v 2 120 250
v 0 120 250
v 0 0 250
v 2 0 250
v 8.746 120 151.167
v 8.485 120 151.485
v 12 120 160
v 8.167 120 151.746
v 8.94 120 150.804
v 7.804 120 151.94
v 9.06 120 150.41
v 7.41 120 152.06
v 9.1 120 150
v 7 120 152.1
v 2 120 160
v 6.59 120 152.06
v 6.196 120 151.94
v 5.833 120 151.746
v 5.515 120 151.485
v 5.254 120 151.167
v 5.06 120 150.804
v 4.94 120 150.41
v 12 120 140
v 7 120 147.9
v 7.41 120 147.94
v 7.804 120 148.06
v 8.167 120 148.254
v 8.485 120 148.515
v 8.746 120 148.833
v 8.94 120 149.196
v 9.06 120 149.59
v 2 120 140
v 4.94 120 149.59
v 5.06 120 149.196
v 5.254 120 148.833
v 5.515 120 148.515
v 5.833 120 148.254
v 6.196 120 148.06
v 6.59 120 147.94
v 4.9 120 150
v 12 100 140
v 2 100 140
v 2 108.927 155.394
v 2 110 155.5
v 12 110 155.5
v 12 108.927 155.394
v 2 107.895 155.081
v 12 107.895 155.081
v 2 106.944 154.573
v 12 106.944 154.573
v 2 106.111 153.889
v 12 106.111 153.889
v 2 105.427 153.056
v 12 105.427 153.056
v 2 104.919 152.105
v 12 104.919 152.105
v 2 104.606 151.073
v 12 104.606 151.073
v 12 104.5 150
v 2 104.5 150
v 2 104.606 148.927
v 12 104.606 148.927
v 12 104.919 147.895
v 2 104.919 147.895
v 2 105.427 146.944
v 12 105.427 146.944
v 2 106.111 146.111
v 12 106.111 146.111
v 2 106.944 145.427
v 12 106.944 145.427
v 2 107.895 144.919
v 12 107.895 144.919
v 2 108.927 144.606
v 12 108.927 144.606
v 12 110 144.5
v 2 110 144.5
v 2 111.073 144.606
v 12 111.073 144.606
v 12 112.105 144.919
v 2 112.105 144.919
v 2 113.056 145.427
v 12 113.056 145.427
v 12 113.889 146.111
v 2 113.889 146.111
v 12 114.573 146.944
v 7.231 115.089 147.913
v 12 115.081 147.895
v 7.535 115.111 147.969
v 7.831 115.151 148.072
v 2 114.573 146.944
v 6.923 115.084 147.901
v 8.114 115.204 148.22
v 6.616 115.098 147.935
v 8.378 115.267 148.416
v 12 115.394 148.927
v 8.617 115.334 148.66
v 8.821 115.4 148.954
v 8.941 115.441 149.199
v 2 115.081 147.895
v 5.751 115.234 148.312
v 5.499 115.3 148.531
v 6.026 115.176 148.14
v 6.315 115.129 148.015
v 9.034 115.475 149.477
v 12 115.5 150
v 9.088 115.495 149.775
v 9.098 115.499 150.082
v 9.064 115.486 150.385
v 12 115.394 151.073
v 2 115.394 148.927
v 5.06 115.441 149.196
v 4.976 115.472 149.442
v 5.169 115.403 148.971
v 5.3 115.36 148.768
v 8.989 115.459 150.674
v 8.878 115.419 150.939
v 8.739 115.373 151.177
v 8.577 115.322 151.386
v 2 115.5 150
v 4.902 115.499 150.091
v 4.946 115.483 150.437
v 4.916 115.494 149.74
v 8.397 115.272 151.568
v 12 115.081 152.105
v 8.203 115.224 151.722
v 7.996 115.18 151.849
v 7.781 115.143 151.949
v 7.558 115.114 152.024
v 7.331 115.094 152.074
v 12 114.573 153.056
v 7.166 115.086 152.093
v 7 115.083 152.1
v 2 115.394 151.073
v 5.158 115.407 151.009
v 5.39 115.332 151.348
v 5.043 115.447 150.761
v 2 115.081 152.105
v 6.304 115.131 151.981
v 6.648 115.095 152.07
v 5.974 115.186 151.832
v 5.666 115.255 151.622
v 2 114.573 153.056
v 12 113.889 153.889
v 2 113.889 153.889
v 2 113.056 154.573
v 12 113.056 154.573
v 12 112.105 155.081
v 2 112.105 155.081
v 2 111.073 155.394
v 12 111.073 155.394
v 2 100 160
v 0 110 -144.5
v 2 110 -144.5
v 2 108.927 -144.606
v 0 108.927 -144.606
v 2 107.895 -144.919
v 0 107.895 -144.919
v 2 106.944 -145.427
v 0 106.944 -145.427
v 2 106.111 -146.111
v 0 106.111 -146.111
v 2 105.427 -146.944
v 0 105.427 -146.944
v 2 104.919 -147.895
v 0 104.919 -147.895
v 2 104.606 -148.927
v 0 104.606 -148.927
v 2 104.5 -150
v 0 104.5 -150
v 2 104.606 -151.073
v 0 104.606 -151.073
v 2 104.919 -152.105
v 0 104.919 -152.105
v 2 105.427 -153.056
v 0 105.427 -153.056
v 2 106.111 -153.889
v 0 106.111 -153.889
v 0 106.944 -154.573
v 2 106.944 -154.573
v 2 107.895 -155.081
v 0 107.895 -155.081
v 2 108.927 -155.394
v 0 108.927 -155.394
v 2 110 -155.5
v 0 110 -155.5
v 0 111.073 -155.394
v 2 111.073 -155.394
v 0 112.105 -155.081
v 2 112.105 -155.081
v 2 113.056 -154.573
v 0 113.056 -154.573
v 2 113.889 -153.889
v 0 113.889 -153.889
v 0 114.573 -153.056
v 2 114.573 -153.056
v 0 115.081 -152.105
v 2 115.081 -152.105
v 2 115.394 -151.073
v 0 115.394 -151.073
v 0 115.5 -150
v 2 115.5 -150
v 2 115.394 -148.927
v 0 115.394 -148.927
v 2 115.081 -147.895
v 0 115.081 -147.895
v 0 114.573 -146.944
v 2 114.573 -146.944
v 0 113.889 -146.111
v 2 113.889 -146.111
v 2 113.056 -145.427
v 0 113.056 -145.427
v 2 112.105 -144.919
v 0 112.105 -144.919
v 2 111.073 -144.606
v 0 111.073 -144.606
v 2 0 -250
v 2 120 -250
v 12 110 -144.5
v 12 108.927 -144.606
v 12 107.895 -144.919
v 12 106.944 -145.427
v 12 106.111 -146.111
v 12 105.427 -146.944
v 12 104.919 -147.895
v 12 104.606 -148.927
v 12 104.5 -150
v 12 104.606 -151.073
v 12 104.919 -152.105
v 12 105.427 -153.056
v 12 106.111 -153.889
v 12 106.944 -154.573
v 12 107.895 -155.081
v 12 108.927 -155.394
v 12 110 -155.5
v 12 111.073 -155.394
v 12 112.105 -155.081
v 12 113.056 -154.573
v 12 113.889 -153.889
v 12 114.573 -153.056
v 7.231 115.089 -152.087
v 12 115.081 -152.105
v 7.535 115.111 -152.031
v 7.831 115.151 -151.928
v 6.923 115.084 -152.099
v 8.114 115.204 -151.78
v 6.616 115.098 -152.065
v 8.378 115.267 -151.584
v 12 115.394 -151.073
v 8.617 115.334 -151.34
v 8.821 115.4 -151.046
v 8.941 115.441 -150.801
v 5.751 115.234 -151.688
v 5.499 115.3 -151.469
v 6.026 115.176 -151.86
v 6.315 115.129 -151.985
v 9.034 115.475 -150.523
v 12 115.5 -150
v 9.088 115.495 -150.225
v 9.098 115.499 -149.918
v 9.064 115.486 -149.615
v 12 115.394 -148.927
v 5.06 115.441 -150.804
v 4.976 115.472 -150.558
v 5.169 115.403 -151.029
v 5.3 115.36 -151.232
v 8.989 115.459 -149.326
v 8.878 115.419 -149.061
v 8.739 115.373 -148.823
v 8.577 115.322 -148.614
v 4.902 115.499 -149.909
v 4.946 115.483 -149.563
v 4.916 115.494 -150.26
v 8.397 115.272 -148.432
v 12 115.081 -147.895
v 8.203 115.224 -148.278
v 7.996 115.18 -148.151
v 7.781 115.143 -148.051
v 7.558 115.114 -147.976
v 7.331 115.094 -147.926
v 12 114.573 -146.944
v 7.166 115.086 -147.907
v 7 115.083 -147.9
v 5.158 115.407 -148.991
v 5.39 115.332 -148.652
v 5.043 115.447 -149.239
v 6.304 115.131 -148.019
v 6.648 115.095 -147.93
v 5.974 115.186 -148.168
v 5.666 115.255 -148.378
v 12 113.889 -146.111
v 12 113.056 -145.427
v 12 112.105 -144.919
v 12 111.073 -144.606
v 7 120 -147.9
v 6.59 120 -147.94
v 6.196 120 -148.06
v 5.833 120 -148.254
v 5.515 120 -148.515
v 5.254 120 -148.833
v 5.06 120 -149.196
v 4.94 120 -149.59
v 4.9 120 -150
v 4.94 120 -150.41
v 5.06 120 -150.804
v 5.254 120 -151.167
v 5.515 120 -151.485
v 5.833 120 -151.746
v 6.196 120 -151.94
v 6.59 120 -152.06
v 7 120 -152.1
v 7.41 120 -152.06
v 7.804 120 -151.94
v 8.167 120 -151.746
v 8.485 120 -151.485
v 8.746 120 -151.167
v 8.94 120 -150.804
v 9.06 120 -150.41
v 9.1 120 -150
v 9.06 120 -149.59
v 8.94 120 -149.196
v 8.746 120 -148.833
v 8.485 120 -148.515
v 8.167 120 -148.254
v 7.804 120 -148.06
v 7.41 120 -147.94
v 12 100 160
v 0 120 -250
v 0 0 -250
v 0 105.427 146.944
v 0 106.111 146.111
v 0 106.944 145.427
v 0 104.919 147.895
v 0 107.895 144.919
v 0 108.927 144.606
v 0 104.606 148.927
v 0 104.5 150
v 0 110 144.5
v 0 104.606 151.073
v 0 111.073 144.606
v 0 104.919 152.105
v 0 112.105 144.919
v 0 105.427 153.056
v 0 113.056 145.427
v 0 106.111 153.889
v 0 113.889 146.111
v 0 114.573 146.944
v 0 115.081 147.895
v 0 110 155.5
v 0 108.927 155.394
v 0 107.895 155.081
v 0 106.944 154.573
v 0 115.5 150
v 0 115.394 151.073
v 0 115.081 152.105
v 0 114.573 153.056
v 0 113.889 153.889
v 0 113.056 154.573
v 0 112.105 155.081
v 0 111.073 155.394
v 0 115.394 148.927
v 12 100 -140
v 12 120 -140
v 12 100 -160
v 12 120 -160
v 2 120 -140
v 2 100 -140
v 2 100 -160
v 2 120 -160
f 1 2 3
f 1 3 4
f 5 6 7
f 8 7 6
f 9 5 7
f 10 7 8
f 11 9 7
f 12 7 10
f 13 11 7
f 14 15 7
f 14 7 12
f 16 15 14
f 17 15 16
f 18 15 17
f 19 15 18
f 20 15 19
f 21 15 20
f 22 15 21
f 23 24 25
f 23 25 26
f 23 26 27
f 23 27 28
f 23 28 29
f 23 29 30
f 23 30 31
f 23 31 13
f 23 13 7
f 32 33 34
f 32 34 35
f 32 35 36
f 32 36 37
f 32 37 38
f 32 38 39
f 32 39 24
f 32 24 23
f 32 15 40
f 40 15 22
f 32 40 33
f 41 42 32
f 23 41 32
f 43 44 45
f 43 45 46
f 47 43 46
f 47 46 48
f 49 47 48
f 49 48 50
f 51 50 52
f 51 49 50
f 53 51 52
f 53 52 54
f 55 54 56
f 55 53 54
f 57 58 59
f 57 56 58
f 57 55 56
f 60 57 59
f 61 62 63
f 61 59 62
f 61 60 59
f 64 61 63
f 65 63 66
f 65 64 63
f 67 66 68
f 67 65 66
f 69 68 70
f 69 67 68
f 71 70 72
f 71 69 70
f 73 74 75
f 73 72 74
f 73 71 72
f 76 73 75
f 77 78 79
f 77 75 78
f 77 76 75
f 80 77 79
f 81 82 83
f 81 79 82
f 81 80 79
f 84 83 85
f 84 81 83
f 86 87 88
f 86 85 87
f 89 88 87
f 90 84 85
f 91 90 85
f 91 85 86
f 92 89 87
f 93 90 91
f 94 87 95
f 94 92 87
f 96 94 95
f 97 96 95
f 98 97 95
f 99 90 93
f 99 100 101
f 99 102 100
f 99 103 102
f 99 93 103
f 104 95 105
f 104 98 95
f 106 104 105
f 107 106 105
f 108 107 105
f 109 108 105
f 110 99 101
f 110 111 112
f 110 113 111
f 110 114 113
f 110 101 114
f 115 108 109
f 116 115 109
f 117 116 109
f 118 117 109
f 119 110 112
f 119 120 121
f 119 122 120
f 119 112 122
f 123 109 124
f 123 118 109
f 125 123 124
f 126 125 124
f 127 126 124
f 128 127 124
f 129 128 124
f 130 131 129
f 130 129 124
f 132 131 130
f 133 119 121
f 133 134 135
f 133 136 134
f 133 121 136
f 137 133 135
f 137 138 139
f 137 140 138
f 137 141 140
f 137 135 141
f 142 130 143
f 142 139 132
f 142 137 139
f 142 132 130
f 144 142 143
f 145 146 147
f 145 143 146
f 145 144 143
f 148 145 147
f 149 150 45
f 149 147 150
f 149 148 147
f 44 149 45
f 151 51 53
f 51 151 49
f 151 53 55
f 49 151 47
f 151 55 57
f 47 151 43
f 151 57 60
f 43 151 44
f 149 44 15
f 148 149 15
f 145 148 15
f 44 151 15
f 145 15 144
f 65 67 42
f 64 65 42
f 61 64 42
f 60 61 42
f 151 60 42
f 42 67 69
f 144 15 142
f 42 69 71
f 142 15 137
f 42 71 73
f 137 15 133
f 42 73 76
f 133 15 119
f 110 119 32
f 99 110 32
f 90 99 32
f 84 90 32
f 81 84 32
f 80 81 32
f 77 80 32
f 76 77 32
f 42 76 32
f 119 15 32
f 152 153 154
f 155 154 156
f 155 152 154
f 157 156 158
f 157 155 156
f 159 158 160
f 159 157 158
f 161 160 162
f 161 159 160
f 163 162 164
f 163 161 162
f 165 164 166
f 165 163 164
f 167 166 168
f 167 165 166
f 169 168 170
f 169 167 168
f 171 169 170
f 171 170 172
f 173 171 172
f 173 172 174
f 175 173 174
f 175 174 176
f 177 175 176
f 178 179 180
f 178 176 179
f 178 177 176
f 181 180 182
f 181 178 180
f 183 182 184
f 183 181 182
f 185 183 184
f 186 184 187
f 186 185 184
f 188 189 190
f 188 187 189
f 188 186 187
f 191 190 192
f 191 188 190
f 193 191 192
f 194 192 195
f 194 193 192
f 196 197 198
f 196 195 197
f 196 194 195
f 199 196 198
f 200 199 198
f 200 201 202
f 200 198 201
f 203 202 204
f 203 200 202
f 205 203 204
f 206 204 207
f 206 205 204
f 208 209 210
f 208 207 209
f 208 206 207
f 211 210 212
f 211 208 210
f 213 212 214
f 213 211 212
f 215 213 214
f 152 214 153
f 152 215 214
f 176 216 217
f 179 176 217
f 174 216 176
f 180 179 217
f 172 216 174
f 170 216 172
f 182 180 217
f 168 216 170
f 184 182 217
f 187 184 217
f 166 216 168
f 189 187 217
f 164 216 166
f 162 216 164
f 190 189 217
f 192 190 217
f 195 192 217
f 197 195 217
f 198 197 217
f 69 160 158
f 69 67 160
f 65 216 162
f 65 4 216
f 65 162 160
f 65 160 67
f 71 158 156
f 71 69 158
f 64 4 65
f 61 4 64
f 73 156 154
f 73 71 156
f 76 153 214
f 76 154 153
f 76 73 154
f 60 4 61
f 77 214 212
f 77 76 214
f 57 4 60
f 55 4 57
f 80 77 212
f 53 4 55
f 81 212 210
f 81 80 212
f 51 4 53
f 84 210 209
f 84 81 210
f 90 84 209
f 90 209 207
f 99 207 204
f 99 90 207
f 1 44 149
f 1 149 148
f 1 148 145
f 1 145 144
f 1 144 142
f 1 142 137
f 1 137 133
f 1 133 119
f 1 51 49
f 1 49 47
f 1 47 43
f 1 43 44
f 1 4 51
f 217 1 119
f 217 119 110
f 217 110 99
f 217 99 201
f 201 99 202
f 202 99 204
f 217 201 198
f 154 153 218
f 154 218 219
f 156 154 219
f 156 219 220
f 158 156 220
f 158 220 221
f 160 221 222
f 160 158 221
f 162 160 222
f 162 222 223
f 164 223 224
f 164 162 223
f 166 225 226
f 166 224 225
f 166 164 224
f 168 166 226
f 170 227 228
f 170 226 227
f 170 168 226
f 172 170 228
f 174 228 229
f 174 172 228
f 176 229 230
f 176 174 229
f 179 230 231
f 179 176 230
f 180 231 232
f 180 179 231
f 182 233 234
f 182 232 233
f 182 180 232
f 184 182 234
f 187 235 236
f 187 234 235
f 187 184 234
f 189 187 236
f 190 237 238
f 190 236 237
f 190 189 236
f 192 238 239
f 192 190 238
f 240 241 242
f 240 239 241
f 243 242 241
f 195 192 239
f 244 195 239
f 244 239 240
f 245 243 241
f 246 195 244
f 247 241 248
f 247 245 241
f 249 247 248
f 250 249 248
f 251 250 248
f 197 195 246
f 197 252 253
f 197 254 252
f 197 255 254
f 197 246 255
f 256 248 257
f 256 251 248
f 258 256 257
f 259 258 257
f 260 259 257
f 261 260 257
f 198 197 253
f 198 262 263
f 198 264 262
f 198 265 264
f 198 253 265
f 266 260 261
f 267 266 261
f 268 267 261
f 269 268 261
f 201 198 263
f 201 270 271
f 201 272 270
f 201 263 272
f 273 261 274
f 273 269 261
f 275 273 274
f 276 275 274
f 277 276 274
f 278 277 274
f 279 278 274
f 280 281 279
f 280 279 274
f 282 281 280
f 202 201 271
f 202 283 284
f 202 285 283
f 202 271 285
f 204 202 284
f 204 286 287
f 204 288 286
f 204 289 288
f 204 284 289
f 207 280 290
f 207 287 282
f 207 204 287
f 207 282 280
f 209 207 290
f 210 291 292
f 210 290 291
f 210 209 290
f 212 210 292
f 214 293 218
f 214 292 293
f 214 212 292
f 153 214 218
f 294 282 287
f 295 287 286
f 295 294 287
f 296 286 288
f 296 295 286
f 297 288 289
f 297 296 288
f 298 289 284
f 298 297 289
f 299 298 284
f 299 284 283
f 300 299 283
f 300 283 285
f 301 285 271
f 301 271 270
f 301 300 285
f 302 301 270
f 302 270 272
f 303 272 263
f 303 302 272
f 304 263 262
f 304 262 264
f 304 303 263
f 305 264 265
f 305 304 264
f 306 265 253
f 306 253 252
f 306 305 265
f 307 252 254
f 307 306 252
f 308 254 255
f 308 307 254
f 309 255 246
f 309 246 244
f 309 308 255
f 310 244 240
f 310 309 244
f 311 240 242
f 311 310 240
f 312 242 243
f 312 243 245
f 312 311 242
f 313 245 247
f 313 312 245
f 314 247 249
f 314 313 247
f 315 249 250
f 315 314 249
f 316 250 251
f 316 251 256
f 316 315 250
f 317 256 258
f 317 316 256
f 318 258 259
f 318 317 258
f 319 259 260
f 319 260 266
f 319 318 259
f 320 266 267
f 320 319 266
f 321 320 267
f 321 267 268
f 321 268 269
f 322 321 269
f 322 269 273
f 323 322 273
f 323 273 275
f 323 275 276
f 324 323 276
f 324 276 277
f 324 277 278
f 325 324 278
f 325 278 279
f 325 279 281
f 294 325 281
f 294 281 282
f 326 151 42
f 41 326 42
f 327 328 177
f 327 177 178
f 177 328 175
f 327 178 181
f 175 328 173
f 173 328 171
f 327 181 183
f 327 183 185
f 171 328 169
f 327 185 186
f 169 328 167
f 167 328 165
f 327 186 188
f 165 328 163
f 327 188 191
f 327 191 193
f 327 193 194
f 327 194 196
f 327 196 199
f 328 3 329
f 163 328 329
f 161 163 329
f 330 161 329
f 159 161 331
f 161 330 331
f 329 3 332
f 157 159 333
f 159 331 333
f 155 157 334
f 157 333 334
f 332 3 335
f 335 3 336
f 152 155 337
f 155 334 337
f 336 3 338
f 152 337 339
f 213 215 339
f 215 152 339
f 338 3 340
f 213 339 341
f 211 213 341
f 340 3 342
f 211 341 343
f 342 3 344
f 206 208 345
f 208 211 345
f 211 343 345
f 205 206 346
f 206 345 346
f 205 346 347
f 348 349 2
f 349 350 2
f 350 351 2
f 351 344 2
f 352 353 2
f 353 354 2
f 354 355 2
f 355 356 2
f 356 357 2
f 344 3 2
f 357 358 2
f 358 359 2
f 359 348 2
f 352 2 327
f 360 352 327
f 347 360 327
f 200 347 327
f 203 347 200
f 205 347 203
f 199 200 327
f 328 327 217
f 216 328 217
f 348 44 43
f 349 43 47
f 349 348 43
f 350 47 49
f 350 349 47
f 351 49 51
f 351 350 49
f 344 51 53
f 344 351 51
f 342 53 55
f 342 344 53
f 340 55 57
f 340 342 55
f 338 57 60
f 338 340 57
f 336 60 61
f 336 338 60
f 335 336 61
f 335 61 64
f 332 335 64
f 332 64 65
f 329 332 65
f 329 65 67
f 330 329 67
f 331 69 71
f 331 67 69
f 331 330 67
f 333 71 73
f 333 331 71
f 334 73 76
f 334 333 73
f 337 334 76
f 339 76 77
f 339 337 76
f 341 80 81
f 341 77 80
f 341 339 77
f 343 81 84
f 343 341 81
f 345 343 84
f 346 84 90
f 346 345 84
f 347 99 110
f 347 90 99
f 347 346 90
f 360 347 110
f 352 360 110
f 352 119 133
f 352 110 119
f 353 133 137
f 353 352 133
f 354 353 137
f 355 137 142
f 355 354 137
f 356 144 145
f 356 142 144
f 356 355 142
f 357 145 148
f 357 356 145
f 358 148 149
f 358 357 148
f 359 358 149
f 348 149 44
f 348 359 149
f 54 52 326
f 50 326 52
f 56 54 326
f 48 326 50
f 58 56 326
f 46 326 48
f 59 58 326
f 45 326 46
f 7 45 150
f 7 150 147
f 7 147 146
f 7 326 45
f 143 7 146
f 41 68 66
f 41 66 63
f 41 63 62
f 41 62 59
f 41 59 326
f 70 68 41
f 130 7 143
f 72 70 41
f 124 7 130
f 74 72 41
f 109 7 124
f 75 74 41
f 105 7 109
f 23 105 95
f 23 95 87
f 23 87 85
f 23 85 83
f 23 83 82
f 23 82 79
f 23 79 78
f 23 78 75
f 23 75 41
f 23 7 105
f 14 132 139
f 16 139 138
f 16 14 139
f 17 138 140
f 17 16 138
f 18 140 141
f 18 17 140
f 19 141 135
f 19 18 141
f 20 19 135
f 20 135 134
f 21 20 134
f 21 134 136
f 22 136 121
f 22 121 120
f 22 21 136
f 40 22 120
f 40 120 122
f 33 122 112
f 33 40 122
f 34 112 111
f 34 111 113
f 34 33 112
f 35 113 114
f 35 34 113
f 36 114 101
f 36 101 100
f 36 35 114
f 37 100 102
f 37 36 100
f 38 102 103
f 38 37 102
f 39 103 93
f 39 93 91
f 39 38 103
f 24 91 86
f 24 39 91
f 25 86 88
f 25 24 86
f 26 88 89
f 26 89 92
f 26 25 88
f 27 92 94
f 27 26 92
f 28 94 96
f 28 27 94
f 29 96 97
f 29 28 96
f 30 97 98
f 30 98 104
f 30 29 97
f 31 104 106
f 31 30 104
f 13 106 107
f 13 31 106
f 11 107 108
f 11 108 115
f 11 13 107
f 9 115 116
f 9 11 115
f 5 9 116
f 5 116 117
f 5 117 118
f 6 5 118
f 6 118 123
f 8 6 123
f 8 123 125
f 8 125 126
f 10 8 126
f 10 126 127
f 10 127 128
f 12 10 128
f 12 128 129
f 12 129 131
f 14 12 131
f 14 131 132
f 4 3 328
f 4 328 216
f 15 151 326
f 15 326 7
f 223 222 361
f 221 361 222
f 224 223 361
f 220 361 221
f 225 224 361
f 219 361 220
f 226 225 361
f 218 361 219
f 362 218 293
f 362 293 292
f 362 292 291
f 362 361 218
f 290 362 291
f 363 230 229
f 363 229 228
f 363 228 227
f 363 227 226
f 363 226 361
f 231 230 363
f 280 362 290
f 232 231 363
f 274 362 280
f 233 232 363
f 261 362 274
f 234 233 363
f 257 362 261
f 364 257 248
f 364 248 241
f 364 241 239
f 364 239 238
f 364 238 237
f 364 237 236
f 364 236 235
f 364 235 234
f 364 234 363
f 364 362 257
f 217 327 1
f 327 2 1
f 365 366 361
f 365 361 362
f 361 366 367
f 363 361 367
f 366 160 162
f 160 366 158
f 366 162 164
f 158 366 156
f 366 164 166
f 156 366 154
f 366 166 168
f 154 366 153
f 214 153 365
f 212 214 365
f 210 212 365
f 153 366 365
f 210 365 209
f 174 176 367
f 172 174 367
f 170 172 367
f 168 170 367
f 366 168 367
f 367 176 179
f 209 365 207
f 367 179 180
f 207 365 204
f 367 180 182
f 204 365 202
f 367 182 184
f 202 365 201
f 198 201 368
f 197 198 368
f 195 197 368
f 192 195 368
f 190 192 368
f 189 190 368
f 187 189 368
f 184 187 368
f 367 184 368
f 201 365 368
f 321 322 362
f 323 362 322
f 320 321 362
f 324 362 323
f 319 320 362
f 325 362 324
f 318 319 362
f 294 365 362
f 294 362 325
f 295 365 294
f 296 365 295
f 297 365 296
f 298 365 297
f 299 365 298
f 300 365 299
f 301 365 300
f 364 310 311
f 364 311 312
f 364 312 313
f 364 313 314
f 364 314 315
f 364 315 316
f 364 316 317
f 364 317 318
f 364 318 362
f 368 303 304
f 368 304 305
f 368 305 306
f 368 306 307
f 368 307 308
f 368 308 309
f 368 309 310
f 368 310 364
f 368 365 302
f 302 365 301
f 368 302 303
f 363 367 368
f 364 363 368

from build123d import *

# Parameters (mm, degrees)
SKIZZE1_W                                 = 2
SKIZZE1_H                                 = 120
BASIS_BLECH1_DEPTH                        = 250
SKIZZE6_W                                 = 20
SKIZZE6_H                                 = 20
AUFSATZ_LINEAR_AUSTRAGEN1_DEPTH           = 10
AUFSATZ_LINEAR_AUSTRAGEN1_2_DEPTH         = 10
F_11_0_11_DURCHMESSER_BOHRUNG1_AT_2_COUNT = 2
F_11_0_11_DURCHMESSER_BOHRUNG1_AT_2_PITCH = 300
M5_GEWINDEBOHRUNG1_AT_2_COUNT             = 2
M5_GEWINDEBOHRUNG1_AT_2_PITCH             = 300


# Sheet-metal steps are written as plain solids
with BuildPart() as part:
    # Skizze1 → Basis-Blech1 (new, symmetric)
    with BuildSketch(Plane.XY):
        with Locations((1, 60)):
            Rectangle(SKIZZE1_W, SKIZZE1_H)
    extrude(amount=BASIS_BLECH1_DEPTH, both=True)


with BuildPart() as body_2:
    # Skizze6 → Aufsatz-Linear austragen1 (new body)
    with BuildSketch(Plane(origin=(2, 0, 0), x_dir=(0, 0, -1), z_dir=(1, 0, 0))):
        with Locations((-150, 110)):
            Rectangle(SKIZZE6_W, SKIZZE6_H)
    extrude(amount=AUFSATZ_LINEAR_AUSTRAGEN1_DEPTH)


with BuildPart() as body_3:
    # Skizze6 → Aufsatz-Linear austragen1 2 (new body)
    with BuildSketch(Plane(origin=(2, 0, 0), x_dir=(0, 0, -1), z_dir=(1, 0, 0))):
        with Locations((150, 110)):
            Rectangle(SKIZZE6_W, SKIZZE6_H)
    extrude(amount=AUFSATZ_LINEAR_AUSTRAGEN1_2_DEPTH)


with BuildPart() as f_11_0_11_durchmesser_bohrung1_tool:
    # Skizze4 → Ø11.0 (11) Durchmesser Bohrung1 (revolve)
    with BuildSketch(Plane(origin=(0, 110, 150), x_dir=(0, 0, 1), z_dir=(0, 1, 0))):
        Polygon((0, 0), (0, 23.304733405), (5.5, 20), (5.5, 0), align=None)
    f_11_0_11_durchmesser_bohrung1 = revolve(axis=Axis((-6.35, 110, 150), (1, 0, 0)))


with BuildPart() as part_1:
    add(part.part)

    # Ø11.0 (11) Durchmesser Bohrung1: cut by f_11_0_11_durchmesser_bohrung1_tool
    add(f_11_0_11_durchmesser_bohrung1_tool.part, mode=Mode.SUBTRACT)


with BuildPart() as body_2_1:
    add(body_2.part)

    # Ø11.0 (11) Durchmesser Bohrung1: cut by f_11_0_11_durchmesser_bohrung1_tool
    add(f_11_0_11_durchmesser_bohrung1_tool.part, mode=Mode.SUBTRACT)

    # Skizze7 → M5 Gewindebohrung1 (revolve, cut)
    with BuildSketch(Plane(origin=(7, 120, 150), x_dir=(0, 0, 1), z_dir=(1, 0, 0))):
        Polygon((0, 0), (0, 15.2618073), (2.1, 14), (2.1, 0), align=None)
    m5_gewindebohrung1 = revolve(axis=Axis((7, 126.35, 150), (0, -1, 0)), mode=Mode.SUBTRACT)


with BuildPart() as f_11_0_11_durchmesser_bohrung1_at_2_tool:
    # Ø11.0 (11) Durchmesser Bohrung1 at 2: Ø11.0 (11) Durchmesser Bohrung1 ×2
    with Locations(*[(0, 0, -i * F_11_0_11_DURCHMESSER_BOHRUNG1_AT_2_PITCH) for i in range(1, F_11_0_11_DURCHMESSER_BOHRUNG1_AT_2_COUNT)]):
        add(f_11_0_11_durchmesser_bohrung1)


with BuildPart() as part_2:
    add(part_1.part)

    # Ø11.0 (11) Durchmesser Bohrung1 at 2: cut by f_11_0_11_durchmesser_bohrung1_at_2_tool
    add(f_11_0_11_durchmesser_bohrung1_at_2_tool.part, mode=Mode.SUBTRACT)


with BuildPart() as body_3_1:
    add(body_3.part)

    # Ø11.0 (11) Durchmesser Bohrung1 at 2: cut by f_11_0_11_durchmesser_bohrung1_at_2_tool
    add(f_11_0_11_durchmesser_bohrung1_at_2_tool.part, mode=Mode.SUBTRACT)

    # M5 Gewindebohrung1 at 2: M5 Gewindebohrung1 ×2
    with Locations(*[(0, 0, -i * M5_GEWINDEBOHRUNG1_AT_2_PITCH) for i in range(1, M5_GEWINDEBOHRUNG1_AT_2_COUNT)]):
        add(m5_gewindebohrung1, mode=Mode.SUBTRACT)


solid = Compound([body_2_1.part, part_2.part, body_3_1.part])
